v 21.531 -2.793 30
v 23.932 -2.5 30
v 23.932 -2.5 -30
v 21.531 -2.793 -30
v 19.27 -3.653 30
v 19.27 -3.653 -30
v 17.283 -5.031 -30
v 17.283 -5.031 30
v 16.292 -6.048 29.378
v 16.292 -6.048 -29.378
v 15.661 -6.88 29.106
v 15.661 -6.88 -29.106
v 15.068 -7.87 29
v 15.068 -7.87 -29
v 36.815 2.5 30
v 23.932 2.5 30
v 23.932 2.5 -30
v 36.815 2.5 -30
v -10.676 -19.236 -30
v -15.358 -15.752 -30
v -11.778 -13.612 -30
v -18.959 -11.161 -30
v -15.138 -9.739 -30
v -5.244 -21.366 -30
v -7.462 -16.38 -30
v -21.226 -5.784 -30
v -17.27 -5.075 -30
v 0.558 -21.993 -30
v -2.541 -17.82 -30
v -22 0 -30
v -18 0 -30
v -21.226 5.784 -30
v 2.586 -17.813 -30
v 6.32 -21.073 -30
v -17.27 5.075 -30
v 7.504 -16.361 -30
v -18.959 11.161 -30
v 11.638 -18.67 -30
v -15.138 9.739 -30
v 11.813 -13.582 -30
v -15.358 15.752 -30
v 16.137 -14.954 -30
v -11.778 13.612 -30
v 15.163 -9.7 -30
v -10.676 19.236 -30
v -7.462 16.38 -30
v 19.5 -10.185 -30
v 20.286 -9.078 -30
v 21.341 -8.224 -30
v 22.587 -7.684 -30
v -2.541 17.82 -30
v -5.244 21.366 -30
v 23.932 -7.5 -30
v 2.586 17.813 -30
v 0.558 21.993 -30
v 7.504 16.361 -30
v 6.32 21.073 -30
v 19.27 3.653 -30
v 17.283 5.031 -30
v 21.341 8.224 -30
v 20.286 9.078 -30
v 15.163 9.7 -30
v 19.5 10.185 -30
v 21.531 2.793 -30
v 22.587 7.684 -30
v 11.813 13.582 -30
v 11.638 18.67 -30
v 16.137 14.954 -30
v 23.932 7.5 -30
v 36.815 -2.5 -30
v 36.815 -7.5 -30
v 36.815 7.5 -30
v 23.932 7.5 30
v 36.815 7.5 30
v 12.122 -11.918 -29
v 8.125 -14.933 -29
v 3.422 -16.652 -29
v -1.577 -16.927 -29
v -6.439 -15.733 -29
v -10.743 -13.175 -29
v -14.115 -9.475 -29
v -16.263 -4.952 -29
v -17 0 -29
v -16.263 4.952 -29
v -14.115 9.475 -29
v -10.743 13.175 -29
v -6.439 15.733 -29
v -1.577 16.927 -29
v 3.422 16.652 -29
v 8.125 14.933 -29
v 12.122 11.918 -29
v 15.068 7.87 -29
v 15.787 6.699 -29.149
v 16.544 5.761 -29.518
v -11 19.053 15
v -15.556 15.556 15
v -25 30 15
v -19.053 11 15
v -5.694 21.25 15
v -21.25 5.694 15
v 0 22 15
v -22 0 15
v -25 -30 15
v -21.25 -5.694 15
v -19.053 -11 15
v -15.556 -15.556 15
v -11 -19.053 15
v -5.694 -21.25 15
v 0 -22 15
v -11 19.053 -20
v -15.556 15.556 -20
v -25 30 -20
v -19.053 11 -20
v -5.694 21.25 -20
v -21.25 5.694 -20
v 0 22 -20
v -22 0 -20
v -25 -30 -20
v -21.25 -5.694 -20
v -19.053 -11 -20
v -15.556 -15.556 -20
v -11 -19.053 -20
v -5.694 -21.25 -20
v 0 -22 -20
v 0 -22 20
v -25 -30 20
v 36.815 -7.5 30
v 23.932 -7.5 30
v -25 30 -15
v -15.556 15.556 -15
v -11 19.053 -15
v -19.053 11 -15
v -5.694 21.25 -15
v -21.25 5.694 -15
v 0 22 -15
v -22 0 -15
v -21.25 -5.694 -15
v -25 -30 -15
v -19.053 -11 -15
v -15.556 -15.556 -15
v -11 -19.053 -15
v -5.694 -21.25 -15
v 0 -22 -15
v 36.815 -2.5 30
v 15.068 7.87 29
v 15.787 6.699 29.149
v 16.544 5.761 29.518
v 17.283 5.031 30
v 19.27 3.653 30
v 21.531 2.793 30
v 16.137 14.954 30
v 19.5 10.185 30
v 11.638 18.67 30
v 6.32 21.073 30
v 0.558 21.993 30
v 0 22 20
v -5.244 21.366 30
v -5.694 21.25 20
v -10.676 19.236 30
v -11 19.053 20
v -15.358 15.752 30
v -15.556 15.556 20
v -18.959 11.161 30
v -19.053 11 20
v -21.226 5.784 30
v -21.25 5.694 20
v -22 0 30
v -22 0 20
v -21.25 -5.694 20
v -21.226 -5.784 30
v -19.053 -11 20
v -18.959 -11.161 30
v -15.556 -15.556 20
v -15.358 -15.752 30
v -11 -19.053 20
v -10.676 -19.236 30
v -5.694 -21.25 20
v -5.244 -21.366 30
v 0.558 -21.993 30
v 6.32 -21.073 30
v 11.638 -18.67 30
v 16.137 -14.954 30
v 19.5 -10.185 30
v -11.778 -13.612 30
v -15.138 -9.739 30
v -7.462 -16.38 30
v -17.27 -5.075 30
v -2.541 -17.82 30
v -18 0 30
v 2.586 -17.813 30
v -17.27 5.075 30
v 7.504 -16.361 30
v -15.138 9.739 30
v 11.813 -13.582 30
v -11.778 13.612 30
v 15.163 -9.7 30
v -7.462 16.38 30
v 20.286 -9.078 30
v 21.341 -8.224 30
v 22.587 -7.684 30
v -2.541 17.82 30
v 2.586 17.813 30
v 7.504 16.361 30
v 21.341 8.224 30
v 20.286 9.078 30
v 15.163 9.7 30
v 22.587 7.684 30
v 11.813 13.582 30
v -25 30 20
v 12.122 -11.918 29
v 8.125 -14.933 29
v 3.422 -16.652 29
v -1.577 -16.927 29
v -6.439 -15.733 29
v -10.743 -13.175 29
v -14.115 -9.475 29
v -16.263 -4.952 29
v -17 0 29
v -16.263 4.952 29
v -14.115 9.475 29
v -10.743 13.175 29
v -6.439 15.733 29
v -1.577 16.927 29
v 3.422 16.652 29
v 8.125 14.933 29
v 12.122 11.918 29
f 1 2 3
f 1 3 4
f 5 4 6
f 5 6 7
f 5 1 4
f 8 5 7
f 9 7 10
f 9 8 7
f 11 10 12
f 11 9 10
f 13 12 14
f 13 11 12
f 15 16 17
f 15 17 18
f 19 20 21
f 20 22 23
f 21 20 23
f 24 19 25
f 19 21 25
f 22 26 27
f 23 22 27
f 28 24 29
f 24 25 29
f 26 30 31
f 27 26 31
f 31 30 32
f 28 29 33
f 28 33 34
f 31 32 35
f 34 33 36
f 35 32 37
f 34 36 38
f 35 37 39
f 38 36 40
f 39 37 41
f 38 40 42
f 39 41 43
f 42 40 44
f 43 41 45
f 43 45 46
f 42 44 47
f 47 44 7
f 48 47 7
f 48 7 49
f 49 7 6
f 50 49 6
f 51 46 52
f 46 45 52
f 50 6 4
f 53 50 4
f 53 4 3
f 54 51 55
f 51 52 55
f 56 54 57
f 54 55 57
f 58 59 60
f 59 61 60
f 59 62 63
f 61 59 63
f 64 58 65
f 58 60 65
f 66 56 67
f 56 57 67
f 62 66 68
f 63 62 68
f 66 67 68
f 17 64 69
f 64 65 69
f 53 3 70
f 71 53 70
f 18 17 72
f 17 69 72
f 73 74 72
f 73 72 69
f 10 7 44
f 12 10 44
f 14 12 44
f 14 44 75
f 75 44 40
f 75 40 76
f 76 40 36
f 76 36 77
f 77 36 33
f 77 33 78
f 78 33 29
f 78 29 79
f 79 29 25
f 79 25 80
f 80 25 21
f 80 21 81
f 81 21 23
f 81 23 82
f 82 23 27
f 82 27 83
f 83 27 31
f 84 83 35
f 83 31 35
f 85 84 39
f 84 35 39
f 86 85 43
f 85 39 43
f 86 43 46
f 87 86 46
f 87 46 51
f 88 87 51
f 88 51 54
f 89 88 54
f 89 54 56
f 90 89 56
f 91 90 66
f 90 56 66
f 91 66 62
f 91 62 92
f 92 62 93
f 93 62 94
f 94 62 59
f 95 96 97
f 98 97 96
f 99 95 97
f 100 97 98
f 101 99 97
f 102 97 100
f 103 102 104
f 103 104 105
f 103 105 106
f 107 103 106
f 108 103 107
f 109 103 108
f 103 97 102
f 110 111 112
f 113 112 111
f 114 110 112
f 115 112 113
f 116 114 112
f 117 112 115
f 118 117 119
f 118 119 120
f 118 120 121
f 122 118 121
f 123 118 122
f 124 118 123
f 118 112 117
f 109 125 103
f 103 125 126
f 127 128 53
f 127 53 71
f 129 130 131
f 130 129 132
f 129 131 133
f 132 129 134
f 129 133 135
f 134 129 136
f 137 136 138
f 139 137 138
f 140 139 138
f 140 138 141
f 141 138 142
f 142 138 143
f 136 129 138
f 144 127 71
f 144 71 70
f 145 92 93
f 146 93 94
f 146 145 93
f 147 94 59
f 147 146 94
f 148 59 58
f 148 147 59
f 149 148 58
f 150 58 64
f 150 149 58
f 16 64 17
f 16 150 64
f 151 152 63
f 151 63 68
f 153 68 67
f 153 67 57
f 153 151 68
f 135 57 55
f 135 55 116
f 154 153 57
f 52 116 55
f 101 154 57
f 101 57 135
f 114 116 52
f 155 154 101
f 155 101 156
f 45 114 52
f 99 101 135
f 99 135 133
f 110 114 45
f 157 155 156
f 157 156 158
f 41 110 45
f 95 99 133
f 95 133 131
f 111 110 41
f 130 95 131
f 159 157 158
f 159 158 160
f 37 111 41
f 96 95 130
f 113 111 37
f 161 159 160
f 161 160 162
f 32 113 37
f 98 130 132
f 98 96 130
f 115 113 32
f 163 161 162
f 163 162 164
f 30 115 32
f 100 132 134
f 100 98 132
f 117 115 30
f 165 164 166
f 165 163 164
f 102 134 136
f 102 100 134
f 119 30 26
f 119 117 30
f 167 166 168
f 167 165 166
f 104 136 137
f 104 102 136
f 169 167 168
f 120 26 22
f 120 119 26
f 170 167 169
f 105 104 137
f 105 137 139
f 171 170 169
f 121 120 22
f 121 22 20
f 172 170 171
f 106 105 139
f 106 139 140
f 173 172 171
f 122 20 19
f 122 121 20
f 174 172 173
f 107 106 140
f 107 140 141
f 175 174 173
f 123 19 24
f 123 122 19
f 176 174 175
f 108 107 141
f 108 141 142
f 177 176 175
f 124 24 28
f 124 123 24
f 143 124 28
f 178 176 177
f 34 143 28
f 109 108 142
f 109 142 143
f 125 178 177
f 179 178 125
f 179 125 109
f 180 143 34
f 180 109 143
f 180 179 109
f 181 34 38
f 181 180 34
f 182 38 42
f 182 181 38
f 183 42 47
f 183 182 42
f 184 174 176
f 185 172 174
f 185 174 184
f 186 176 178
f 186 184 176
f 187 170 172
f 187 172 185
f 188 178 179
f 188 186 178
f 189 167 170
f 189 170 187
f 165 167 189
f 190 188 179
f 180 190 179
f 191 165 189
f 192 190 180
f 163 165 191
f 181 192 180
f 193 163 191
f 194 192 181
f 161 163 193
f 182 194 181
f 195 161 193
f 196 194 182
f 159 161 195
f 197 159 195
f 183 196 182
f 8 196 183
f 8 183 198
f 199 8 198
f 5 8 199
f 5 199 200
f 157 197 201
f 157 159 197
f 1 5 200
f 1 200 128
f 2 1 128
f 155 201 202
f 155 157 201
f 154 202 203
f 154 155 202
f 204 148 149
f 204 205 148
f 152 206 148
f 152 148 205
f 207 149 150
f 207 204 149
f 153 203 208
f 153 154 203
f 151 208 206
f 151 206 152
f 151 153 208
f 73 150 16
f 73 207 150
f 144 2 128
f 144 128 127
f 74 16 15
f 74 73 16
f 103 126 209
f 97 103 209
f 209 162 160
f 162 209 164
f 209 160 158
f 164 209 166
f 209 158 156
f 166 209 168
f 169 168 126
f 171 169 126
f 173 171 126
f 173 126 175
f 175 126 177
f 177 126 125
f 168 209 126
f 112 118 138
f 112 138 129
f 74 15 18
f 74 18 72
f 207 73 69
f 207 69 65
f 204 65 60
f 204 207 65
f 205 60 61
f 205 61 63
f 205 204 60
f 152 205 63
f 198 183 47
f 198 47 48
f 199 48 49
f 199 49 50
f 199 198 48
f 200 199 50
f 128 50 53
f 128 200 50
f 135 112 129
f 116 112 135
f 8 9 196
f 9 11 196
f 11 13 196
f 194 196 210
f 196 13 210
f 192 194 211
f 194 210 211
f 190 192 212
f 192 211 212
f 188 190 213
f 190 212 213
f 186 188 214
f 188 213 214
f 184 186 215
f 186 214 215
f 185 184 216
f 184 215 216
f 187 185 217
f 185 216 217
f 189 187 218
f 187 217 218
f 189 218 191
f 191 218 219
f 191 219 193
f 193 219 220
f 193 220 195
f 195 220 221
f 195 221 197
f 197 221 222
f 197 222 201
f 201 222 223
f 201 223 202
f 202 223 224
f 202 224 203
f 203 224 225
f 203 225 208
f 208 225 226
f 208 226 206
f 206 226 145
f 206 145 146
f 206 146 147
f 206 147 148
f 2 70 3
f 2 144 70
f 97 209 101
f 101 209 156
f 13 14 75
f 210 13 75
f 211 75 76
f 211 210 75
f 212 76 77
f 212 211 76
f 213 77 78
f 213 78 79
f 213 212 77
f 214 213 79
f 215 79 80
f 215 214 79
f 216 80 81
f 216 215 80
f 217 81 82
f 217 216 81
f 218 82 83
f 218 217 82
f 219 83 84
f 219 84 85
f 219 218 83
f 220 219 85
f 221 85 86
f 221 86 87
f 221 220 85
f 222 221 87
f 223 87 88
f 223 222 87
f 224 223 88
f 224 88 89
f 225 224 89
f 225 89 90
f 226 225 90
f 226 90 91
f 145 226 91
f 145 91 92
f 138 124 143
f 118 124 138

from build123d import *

# Parameters (mm, degrees)
F1_DEPTH    = 30
F2_T2_ANGLE = 334.4485965255
F2_T4_ANGLE = 334.4485965255
F4_START    = -10
F4_DEPTH    = 5


# Not quite as in the source:
# - a fillet or chamfer that OpenCascade refuses, or shapes differently, is made with other operations: its cross-section is extruded or revolved along the edge and cut away or added


with BuildPart() as f1:
    # F0 (on Top) → F1 (new body, symmetric)
    with BuildSketch(Plane.XY):
        with BuildLine():
            ThreePointArc((15.0684196329, -7.8703703704), (-17, 0), (15.0684196329, 7.8703703704))
            ThreePointArc((15.0684196329, 7.8703703704), (18.7503186358, 3.9473309343), (23.9321958875, 2.5))
            Line((23.9321958875, 2.5), (36.8151717208, 2.5))
            Line((36.8151717208, 2.5), (36.8151717208, 7.5))
            Line((36.8151717208, 7.5), (23.9321958875, 7.5))
            ThreePointArc((23.9321958875, 7.5), (21.3412572617, 8.2236654671), (19.5003077602, 10.1851851852))
            ThreePointArc((19.5003077602, 10.1851851852), (-22, 0), (19.5003077602, -10.1851851852))
            ThreePointArc((19.5003077602, -10.1851851852), (21.3412572617, -8.2236654671), (23.9321958875, -7.5))
            Line((23.9321958875, -7.5), (36.8151717208, -7.5))
            Line((36.8151717208, -7.5), (36.8151717208, -2.5))
            Line((36.8151717208, -2.5), (23.9321958875, -2.5))
            ThreePointArc((23.9321958875, -2.5), (18.7503186358, -3.9473309343), (15.0684196329, -7.8703703704))
        make_face()
    extrude(amount=F1_DEPTH, both=True)

    # F2: chamfer of 1 on 2 edges, made by hand

    # F2_s1 → F2_t2 (revolve, cut)
    with BuildSketch(Plane(origin=(0, 0, 0), x_dir=(0, 0, 1), z_dir=(0.2211349318, 0.9752432219, 0))):
        Polygon((30, 18), (29, 17), (30, 17), align=None)
    revolve(axis=Axis((0, 0, 30), (0, 0, -1)), revolution_arc=F2_T2_ANGLE, mode=Mode.SUBTRACT)

    # F2_s3 → F2_t4 (revolve, cut)
    with BuildSketch(Plane(origin=(0, 0, 0), x_dir=(0, 0, 1), z_dir=(0.2211349318, 0.9752432219, 0))):
        Polygon((-29, 17), (-30, 18), (-30, 17), align=None)
    revolve(axis=Axis((0, 0, -30), (0, 0, -1)), revolution_arc=F2_T4_ANGLE, mode=Mode.SUBTRACT)

    # F3 (on face) → F4 (join)
    with BuildSketch(Plane(origin=(0, 0, -30), x_dir=(1, 0, 0), z_dir=(0, 0, -1)).offset(F4_START)):
        with BuildLine():
            ThreePointArc((0, -22), (-22, 0), (0, 22))
            Line((0, 22), (-25, 30))
            Line((-25, 30), (-25, -30))
            Line((-25, -30), (0, -22))
        make_face()
    extrude(amount=-F4_DEPTH)

    # F5: F1 across plane


with BuildPart() as f1_1:
    add(f1.part)
    add(f1.part.mirror(Plane.XY))


solid = f1_1.part
